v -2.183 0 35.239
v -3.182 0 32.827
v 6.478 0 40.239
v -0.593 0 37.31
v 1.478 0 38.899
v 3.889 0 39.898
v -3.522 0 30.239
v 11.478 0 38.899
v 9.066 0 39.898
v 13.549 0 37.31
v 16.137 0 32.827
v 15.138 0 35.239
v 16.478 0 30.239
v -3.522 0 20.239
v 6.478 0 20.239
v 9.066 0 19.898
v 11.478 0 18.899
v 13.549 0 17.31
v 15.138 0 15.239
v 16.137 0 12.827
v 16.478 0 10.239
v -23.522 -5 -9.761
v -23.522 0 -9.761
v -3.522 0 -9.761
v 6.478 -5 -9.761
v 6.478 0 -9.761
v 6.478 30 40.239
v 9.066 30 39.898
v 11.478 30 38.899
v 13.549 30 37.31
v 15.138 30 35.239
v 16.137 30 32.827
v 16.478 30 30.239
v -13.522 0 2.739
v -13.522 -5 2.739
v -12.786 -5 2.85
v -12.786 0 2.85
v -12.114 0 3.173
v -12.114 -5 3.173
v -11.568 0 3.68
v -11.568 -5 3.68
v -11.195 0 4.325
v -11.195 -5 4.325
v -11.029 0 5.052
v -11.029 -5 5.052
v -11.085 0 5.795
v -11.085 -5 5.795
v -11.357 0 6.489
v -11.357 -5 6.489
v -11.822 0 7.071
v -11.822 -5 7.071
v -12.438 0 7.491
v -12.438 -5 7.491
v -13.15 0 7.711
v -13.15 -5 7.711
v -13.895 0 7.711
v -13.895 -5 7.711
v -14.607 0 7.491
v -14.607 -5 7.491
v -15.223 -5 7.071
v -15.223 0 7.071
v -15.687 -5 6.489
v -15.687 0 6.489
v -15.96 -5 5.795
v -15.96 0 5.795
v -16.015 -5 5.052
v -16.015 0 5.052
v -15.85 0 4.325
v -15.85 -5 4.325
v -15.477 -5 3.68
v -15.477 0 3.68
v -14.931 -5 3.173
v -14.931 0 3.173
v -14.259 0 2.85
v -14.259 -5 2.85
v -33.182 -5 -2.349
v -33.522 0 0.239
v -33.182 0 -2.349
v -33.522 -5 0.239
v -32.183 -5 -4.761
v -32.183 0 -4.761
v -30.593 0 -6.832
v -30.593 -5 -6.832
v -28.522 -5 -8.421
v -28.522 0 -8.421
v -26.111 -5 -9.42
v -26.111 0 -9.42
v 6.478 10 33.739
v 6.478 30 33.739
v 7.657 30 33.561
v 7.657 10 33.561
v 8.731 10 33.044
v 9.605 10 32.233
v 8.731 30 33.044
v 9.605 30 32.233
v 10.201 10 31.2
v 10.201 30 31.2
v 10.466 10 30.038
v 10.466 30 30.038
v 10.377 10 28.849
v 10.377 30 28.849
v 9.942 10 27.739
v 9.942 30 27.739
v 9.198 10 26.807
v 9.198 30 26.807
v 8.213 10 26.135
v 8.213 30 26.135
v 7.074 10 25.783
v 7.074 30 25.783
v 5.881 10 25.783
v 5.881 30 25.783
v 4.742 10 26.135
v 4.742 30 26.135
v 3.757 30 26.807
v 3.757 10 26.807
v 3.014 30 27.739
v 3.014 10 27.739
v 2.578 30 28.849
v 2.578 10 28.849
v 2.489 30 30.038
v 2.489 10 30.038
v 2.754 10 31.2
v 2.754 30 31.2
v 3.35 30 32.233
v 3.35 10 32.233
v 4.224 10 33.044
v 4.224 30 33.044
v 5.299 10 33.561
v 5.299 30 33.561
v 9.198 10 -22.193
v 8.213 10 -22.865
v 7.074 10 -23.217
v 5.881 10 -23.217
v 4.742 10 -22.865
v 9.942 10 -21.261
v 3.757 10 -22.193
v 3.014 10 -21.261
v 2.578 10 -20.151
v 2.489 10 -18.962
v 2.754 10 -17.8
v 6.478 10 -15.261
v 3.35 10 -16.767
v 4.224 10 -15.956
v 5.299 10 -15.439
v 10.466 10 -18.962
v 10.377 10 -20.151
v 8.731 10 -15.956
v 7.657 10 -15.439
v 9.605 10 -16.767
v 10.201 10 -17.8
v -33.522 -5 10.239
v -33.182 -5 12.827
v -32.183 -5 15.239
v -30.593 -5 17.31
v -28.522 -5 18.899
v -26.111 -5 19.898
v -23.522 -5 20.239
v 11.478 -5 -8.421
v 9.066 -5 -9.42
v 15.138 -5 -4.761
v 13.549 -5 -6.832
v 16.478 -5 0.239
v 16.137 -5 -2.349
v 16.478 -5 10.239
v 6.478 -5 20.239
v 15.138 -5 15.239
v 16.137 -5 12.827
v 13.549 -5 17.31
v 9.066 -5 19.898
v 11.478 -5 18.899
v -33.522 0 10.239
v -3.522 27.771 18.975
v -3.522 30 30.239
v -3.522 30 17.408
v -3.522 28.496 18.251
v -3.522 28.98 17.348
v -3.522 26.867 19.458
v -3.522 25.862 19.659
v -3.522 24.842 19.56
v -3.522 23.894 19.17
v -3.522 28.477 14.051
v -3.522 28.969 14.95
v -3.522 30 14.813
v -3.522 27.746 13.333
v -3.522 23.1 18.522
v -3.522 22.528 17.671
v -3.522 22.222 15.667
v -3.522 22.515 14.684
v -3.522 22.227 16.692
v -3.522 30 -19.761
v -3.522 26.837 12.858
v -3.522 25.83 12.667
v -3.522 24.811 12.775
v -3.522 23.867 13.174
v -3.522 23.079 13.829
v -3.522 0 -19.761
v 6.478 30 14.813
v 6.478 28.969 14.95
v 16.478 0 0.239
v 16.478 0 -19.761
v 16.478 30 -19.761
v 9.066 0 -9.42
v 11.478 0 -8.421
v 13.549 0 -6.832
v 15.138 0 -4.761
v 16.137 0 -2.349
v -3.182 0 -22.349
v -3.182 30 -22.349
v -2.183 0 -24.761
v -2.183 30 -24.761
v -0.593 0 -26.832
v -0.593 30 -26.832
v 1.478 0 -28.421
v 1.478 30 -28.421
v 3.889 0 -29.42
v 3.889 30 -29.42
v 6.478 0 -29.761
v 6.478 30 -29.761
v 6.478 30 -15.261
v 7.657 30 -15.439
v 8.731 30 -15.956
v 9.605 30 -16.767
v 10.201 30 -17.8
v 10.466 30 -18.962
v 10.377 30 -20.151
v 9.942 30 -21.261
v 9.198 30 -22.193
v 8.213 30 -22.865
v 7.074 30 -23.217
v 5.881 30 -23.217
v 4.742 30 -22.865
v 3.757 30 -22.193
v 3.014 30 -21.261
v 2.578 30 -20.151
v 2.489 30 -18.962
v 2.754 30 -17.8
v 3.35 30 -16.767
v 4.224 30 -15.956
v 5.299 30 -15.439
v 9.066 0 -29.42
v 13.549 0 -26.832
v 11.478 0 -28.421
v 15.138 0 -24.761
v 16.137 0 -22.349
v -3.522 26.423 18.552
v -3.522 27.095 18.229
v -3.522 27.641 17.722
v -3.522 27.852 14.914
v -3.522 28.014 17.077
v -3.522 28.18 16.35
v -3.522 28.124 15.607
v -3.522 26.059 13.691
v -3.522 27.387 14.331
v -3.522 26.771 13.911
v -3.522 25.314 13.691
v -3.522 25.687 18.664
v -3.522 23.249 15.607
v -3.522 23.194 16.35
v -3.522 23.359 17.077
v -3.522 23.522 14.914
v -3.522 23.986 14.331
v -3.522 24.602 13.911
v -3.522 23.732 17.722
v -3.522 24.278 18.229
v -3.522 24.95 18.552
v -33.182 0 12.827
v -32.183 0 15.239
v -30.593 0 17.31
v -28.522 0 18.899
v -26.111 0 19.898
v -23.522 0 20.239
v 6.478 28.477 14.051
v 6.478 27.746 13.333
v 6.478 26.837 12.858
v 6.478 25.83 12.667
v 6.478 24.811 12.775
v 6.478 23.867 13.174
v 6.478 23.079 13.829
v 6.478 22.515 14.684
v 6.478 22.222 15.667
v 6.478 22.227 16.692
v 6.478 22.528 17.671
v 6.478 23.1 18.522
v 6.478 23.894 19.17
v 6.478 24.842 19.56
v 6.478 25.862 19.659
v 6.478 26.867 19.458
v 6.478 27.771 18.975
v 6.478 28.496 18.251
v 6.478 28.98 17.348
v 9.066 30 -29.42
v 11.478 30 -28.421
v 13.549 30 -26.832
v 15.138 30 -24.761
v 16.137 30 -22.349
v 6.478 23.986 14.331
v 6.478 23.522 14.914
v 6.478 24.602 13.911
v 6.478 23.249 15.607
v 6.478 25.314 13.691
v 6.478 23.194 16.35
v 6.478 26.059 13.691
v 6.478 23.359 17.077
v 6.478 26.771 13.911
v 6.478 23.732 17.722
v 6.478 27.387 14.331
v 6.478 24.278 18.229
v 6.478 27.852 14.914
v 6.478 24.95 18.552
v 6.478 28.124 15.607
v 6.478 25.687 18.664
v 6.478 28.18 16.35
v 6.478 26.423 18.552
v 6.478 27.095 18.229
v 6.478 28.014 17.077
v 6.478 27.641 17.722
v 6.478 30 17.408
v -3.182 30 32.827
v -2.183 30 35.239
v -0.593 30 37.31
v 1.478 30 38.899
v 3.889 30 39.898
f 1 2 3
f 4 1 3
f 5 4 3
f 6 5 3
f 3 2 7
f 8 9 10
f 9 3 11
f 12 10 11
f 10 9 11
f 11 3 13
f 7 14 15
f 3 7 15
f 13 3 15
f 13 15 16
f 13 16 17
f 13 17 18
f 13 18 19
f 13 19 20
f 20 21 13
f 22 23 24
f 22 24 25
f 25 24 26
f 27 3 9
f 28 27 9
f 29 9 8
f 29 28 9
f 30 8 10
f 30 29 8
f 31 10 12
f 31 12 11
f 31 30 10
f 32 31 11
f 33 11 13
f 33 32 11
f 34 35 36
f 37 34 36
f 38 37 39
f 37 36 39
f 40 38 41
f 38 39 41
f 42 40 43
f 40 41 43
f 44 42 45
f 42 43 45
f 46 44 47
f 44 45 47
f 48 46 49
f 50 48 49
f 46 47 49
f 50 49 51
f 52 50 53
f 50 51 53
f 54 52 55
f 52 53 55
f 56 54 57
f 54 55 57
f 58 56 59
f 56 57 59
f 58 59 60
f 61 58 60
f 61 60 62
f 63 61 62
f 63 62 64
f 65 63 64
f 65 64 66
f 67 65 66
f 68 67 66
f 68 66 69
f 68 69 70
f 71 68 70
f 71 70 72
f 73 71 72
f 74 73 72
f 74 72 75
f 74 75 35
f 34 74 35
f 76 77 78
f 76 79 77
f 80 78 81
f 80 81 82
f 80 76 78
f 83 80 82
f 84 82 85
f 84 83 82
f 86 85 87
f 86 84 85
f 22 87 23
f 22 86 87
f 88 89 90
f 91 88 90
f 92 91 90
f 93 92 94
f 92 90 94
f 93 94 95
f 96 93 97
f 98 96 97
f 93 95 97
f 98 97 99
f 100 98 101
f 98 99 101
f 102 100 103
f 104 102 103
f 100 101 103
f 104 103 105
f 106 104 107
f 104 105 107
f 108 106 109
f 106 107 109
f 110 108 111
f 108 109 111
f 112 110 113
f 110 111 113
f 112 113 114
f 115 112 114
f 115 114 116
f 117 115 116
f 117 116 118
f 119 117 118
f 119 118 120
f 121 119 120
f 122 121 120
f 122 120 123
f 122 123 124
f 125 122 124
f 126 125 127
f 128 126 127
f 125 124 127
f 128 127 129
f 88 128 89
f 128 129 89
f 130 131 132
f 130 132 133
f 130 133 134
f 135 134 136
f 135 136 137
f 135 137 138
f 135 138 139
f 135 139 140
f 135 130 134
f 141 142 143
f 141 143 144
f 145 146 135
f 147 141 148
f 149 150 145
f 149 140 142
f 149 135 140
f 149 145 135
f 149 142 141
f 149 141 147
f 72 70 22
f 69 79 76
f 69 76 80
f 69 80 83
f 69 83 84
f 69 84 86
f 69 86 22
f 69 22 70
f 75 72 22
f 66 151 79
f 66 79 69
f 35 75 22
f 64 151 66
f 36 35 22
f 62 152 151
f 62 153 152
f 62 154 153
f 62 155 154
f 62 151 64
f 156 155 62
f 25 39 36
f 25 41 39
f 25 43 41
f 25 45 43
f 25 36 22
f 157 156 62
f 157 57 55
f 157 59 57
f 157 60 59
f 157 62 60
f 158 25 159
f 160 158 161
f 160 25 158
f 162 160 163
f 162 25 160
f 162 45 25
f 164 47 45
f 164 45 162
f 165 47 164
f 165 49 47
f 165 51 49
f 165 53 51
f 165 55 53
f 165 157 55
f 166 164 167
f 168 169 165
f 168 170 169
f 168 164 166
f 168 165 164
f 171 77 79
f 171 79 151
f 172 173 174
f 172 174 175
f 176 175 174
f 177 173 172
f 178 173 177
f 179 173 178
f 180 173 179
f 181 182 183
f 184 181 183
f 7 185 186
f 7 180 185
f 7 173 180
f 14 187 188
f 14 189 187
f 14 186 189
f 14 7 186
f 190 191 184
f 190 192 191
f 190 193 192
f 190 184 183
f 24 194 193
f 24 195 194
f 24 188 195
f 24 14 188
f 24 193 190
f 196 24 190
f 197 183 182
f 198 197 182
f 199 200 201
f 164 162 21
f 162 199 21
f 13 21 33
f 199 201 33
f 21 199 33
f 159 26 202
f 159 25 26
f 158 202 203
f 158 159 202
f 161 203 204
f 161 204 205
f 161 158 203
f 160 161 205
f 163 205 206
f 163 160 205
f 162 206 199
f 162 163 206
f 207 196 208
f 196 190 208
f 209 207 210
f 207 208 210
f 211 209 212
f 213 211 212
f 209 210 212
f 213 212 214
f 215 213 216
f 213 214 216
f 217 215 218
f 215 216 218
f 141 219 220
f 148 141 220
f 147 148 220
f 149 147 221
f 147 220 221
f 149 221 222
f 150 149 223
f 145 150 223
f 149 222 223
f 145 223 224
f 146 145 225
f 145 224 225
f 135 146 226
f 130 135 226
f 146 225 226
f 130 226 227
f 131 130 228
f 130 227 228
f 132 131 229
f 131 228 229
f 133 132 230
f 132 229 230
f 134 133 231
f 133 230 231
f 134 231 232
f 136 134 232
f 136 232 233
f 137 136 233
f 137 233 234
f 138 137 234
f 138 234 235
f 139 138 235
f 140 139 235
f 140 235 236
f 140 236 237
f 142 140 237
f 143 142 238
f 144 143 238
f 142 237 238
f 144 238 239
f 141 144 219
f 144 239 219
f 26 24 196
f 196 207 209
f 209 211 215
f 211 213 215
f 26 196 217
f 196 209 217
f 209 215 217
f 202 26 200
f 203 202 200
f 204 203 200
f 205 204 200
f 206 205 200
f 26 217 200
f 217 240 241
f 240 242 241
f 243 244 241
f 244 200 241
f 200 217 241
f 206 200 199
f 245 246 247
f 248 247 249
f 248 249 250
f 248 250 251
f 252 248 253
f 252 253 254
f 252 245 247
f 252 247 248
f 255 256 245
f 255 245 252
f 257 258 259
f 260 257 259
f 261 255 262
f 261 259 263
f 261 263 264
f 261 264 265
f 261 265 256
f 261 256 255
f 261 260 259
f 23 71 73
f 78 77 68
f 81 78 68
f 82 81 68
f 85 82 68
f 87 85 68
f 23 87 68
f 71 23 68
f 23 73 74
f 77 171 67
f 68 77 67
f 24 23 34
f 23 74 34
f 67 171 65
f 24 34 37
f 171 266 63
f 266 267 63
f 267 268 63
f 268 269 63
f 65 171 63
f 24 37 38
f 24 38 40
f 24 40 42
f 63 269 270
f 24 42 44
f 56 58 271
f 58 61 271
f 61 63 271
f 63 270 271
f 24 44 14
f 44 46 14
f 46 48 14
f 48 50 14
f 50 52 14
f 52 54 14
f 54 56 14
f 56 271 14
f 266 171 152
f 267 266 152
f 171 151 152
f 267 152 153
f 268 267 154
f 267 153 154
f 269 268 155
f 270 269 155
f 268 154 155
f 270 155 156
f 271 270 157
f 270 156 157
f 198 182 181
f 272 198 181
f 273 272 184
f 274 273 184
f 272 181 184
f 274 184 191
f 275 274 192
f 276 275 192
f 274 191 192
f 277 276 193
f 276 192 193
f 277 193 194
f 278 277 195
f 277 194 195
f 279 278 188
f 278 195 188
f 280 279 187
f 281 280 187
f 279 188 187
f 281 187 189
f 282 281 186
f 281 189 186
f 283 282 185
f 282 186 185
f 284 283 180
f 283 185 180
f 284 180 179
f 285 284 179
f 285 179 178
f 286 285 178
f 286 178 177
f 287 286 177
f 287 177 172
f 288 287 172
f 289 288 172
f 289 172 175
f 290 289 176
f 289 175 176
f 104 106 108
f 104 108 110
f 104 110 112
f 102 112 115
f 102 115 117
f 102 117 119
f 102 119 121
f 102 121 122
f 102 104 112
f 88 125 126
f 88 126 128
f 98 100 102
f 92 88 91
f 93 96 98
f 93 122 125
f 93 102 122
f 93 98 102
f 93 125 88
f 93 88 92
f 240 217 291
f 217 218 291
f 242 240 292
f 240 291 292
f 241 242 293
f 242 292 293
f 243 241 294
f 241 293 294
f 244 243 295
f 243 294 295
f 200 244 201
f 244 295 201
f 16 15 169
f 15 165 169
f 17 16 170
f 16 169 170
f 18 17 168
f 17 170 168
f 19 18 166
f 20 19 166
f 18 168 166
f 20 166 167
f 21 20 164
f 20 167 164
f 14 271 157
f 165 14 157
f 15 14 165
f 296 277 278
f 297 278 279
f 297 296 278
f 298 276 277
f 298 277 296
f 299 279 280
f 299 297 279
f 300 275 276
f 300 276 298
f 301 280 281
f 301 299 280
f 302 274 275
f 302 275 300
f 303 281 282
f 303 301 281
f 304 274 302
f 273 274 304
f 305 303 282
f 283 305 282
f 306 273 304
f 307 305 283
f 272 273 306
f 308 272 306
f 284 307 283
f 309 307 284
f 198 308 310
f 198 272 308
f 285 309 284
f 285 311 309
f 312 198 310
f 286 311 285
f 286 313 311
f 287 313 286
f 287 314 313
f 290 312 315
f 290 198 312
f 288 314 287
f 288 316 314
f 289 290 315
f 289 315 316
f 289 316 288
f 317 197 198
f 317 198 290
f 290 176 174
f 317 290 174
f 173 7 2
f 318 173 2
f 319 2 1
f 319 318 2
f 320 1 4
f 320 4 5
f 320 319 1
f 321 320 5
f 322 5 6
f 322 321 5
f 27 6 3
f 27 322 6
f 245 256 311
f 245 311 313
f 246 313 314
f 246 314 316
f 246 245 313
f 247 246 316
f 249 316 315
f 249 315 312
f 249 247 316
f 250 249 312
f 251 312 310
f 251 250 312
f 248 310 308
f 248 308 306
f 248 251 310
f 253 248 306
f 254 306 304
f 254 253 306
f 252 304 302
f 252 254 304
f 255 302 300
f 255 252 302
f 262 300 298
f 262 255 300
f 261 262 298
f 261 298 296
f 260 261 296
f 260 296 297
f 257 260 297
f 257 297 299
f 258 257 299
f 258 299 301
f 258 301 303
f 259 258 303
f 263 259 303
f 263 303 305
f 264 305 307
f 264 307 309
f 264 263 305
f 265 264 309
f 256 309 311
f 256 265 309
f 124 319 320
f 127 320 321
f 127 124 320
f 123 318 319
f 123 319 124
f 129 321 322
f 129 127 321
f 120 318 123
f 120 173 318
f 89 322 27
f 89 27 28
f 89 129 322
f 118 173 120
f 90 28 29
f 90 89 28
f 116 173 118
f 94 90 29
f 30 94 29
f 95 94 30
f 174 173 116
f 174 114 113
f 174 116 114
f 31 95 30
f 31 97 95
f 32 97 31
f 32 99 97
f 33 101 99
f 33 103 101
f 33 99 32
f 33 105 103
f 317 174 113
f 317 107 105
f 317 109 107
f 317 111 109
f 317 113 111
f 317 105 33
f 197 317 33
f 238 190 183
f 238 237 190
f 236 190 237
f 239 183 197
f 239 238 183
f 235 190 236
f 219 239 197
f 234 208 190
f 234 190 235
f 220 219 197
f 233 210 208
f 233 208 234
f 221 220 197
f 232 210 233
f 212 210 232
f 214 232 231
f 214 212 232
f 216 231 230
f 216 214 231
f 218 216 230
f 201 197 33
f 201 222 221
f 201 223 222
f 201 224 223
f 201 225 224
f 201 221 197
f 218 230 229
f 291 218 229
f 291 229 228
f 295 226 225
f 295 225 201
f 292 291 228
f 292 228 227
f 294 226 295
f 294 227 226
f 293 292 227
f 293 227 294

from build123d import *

# Parameters (mm, degrees)
SKETCH2_W           = 20
SKETCH2_H           = 70
BOSS_EXTRUDE1_DEPTH = 30
SKETCH3_R           = 4
CUT_EXTRUDE1_DEPTH  = 20
SKETCH4_R           = 2.5
CUT_EXTRUDE2_DEPTH  = 10
FILLET1_R           = 10
SKETCH6_W           = 50
SKETCH6_H           = 30
BOSS_EXTRUDE3_DEPTH = 5
SKETCH7_R           = 2.5
CUT_EXTRUDE3_DEPTH  = 10
FILLET3_R           = 10


with BuildPart() as part:
    # Sketch2 → Boss-Extrude1 (new body)
    with BuildSketch(Plane(origin=(0, 0, 0), x_dir=(1, 0, 0), z_dir=(0, 1, 0))):
        with Locations((6.47761194, -5.23880597)):
            Rectangle(SKETCH2_W, SKETCH2_H)
    extrude(amount=BOSS_EXTRUDE1_DEPTH)

    # Sketch3 → Cut-Extrude1 (cut)
    with BuildSketch(Plane(origin=(0, 30, 0), x_dir=(1, 0, 0), z_dir=(0, 1, 0))):
        with Locations(Location((6.47761194, 19.26119403, 0), (0, 0, 270))):
            Circle(SKETCH3_R)
        with Locations(Location((6.47761194, -29.73880597, 0), (0, 0, 270))):
            Circle(SKETCH3_R)
    extrude(amount=-CUT_EXTRUDE1_DEPTH, mode=Mode.SUBTRACT)

    # Sketch4 → Cut-Extrude2 (cut)
    with BuildSketch(Plane.ZY.offset(3.52238806)):
        with BuildLine():
            Line((17.415034126, 30.126407987), (14.795699792, 30.126407987))
            Line((14.795699792, 30.126407987), (14.949961333, 28.969446425))
            ThreePointArc((14.949961333, 28.969446425), (16.17927412, 22.186618473), (17.347611009, 28.980215007))
            Line((17.347611009, 28.980215007), (17.415034126, 30.126407987))
        make_face()
        with Locations((16.163554702, 25.686583173)):
            Circle(SKETCH4_R, mode=Mode.SUBTRACT)
    extrude(amount=-CUT_EXTRUDE2_DEPTH, mode=Mode.SUBTRACT)

    # Fillet1
    fillet1_edges = [part.edges().sort_by_distance(p)[0] for p in [
        (-3.52238806, 15, -29.76119403),
        (16.47761194, 15, -29.76119403),
        (16.47761194, 15, 40.23880597),
        (-3.52238806, 15, 40.23880597),
    ]]
    fillet(fillet1_edges, radius=FILLET1_R - 0.0001)  # a hair under: the kernel refuses the full size

    # Sketch6 → Boss-Extrude3 (add)
    with BuildSketch(Plane.XZ):
        with Locations((-8.52238806, 5.23880597)):
            Rectangle(SKETCH6_W, SKETCH6_H)
    extrude(amount=BOSS_EXTRUDE3_DEPTH)

    # Sketch7 → Cut-Extrude3 (cut)
    with BuildSketch(Plane.XZ.offset(5)):
        with Locations(Location((-13.52238806, 5.23880597, 0), (0, 0, 270))):
            Circle(SKETCH7_R)
    extrude(amount=-CUT_EXTRUDE3_DEPTH, mode=Mode.SUBTRACT)

    # Fillet3
    fillet3_edges = [part.edges().sort_by_distance(p)[0] for p in [
        (-33.52238806, -2.5, 20.23880597),
        (-33.52238806, -2.5, -9.76119403),
        (16.47761194, -2.5, -9.76119403),
        (16.47761194, -2.5, 20.23880597),
    ]]
    fillet(fillet3_edges, radius=FILLET3_R)


solid = part.part
